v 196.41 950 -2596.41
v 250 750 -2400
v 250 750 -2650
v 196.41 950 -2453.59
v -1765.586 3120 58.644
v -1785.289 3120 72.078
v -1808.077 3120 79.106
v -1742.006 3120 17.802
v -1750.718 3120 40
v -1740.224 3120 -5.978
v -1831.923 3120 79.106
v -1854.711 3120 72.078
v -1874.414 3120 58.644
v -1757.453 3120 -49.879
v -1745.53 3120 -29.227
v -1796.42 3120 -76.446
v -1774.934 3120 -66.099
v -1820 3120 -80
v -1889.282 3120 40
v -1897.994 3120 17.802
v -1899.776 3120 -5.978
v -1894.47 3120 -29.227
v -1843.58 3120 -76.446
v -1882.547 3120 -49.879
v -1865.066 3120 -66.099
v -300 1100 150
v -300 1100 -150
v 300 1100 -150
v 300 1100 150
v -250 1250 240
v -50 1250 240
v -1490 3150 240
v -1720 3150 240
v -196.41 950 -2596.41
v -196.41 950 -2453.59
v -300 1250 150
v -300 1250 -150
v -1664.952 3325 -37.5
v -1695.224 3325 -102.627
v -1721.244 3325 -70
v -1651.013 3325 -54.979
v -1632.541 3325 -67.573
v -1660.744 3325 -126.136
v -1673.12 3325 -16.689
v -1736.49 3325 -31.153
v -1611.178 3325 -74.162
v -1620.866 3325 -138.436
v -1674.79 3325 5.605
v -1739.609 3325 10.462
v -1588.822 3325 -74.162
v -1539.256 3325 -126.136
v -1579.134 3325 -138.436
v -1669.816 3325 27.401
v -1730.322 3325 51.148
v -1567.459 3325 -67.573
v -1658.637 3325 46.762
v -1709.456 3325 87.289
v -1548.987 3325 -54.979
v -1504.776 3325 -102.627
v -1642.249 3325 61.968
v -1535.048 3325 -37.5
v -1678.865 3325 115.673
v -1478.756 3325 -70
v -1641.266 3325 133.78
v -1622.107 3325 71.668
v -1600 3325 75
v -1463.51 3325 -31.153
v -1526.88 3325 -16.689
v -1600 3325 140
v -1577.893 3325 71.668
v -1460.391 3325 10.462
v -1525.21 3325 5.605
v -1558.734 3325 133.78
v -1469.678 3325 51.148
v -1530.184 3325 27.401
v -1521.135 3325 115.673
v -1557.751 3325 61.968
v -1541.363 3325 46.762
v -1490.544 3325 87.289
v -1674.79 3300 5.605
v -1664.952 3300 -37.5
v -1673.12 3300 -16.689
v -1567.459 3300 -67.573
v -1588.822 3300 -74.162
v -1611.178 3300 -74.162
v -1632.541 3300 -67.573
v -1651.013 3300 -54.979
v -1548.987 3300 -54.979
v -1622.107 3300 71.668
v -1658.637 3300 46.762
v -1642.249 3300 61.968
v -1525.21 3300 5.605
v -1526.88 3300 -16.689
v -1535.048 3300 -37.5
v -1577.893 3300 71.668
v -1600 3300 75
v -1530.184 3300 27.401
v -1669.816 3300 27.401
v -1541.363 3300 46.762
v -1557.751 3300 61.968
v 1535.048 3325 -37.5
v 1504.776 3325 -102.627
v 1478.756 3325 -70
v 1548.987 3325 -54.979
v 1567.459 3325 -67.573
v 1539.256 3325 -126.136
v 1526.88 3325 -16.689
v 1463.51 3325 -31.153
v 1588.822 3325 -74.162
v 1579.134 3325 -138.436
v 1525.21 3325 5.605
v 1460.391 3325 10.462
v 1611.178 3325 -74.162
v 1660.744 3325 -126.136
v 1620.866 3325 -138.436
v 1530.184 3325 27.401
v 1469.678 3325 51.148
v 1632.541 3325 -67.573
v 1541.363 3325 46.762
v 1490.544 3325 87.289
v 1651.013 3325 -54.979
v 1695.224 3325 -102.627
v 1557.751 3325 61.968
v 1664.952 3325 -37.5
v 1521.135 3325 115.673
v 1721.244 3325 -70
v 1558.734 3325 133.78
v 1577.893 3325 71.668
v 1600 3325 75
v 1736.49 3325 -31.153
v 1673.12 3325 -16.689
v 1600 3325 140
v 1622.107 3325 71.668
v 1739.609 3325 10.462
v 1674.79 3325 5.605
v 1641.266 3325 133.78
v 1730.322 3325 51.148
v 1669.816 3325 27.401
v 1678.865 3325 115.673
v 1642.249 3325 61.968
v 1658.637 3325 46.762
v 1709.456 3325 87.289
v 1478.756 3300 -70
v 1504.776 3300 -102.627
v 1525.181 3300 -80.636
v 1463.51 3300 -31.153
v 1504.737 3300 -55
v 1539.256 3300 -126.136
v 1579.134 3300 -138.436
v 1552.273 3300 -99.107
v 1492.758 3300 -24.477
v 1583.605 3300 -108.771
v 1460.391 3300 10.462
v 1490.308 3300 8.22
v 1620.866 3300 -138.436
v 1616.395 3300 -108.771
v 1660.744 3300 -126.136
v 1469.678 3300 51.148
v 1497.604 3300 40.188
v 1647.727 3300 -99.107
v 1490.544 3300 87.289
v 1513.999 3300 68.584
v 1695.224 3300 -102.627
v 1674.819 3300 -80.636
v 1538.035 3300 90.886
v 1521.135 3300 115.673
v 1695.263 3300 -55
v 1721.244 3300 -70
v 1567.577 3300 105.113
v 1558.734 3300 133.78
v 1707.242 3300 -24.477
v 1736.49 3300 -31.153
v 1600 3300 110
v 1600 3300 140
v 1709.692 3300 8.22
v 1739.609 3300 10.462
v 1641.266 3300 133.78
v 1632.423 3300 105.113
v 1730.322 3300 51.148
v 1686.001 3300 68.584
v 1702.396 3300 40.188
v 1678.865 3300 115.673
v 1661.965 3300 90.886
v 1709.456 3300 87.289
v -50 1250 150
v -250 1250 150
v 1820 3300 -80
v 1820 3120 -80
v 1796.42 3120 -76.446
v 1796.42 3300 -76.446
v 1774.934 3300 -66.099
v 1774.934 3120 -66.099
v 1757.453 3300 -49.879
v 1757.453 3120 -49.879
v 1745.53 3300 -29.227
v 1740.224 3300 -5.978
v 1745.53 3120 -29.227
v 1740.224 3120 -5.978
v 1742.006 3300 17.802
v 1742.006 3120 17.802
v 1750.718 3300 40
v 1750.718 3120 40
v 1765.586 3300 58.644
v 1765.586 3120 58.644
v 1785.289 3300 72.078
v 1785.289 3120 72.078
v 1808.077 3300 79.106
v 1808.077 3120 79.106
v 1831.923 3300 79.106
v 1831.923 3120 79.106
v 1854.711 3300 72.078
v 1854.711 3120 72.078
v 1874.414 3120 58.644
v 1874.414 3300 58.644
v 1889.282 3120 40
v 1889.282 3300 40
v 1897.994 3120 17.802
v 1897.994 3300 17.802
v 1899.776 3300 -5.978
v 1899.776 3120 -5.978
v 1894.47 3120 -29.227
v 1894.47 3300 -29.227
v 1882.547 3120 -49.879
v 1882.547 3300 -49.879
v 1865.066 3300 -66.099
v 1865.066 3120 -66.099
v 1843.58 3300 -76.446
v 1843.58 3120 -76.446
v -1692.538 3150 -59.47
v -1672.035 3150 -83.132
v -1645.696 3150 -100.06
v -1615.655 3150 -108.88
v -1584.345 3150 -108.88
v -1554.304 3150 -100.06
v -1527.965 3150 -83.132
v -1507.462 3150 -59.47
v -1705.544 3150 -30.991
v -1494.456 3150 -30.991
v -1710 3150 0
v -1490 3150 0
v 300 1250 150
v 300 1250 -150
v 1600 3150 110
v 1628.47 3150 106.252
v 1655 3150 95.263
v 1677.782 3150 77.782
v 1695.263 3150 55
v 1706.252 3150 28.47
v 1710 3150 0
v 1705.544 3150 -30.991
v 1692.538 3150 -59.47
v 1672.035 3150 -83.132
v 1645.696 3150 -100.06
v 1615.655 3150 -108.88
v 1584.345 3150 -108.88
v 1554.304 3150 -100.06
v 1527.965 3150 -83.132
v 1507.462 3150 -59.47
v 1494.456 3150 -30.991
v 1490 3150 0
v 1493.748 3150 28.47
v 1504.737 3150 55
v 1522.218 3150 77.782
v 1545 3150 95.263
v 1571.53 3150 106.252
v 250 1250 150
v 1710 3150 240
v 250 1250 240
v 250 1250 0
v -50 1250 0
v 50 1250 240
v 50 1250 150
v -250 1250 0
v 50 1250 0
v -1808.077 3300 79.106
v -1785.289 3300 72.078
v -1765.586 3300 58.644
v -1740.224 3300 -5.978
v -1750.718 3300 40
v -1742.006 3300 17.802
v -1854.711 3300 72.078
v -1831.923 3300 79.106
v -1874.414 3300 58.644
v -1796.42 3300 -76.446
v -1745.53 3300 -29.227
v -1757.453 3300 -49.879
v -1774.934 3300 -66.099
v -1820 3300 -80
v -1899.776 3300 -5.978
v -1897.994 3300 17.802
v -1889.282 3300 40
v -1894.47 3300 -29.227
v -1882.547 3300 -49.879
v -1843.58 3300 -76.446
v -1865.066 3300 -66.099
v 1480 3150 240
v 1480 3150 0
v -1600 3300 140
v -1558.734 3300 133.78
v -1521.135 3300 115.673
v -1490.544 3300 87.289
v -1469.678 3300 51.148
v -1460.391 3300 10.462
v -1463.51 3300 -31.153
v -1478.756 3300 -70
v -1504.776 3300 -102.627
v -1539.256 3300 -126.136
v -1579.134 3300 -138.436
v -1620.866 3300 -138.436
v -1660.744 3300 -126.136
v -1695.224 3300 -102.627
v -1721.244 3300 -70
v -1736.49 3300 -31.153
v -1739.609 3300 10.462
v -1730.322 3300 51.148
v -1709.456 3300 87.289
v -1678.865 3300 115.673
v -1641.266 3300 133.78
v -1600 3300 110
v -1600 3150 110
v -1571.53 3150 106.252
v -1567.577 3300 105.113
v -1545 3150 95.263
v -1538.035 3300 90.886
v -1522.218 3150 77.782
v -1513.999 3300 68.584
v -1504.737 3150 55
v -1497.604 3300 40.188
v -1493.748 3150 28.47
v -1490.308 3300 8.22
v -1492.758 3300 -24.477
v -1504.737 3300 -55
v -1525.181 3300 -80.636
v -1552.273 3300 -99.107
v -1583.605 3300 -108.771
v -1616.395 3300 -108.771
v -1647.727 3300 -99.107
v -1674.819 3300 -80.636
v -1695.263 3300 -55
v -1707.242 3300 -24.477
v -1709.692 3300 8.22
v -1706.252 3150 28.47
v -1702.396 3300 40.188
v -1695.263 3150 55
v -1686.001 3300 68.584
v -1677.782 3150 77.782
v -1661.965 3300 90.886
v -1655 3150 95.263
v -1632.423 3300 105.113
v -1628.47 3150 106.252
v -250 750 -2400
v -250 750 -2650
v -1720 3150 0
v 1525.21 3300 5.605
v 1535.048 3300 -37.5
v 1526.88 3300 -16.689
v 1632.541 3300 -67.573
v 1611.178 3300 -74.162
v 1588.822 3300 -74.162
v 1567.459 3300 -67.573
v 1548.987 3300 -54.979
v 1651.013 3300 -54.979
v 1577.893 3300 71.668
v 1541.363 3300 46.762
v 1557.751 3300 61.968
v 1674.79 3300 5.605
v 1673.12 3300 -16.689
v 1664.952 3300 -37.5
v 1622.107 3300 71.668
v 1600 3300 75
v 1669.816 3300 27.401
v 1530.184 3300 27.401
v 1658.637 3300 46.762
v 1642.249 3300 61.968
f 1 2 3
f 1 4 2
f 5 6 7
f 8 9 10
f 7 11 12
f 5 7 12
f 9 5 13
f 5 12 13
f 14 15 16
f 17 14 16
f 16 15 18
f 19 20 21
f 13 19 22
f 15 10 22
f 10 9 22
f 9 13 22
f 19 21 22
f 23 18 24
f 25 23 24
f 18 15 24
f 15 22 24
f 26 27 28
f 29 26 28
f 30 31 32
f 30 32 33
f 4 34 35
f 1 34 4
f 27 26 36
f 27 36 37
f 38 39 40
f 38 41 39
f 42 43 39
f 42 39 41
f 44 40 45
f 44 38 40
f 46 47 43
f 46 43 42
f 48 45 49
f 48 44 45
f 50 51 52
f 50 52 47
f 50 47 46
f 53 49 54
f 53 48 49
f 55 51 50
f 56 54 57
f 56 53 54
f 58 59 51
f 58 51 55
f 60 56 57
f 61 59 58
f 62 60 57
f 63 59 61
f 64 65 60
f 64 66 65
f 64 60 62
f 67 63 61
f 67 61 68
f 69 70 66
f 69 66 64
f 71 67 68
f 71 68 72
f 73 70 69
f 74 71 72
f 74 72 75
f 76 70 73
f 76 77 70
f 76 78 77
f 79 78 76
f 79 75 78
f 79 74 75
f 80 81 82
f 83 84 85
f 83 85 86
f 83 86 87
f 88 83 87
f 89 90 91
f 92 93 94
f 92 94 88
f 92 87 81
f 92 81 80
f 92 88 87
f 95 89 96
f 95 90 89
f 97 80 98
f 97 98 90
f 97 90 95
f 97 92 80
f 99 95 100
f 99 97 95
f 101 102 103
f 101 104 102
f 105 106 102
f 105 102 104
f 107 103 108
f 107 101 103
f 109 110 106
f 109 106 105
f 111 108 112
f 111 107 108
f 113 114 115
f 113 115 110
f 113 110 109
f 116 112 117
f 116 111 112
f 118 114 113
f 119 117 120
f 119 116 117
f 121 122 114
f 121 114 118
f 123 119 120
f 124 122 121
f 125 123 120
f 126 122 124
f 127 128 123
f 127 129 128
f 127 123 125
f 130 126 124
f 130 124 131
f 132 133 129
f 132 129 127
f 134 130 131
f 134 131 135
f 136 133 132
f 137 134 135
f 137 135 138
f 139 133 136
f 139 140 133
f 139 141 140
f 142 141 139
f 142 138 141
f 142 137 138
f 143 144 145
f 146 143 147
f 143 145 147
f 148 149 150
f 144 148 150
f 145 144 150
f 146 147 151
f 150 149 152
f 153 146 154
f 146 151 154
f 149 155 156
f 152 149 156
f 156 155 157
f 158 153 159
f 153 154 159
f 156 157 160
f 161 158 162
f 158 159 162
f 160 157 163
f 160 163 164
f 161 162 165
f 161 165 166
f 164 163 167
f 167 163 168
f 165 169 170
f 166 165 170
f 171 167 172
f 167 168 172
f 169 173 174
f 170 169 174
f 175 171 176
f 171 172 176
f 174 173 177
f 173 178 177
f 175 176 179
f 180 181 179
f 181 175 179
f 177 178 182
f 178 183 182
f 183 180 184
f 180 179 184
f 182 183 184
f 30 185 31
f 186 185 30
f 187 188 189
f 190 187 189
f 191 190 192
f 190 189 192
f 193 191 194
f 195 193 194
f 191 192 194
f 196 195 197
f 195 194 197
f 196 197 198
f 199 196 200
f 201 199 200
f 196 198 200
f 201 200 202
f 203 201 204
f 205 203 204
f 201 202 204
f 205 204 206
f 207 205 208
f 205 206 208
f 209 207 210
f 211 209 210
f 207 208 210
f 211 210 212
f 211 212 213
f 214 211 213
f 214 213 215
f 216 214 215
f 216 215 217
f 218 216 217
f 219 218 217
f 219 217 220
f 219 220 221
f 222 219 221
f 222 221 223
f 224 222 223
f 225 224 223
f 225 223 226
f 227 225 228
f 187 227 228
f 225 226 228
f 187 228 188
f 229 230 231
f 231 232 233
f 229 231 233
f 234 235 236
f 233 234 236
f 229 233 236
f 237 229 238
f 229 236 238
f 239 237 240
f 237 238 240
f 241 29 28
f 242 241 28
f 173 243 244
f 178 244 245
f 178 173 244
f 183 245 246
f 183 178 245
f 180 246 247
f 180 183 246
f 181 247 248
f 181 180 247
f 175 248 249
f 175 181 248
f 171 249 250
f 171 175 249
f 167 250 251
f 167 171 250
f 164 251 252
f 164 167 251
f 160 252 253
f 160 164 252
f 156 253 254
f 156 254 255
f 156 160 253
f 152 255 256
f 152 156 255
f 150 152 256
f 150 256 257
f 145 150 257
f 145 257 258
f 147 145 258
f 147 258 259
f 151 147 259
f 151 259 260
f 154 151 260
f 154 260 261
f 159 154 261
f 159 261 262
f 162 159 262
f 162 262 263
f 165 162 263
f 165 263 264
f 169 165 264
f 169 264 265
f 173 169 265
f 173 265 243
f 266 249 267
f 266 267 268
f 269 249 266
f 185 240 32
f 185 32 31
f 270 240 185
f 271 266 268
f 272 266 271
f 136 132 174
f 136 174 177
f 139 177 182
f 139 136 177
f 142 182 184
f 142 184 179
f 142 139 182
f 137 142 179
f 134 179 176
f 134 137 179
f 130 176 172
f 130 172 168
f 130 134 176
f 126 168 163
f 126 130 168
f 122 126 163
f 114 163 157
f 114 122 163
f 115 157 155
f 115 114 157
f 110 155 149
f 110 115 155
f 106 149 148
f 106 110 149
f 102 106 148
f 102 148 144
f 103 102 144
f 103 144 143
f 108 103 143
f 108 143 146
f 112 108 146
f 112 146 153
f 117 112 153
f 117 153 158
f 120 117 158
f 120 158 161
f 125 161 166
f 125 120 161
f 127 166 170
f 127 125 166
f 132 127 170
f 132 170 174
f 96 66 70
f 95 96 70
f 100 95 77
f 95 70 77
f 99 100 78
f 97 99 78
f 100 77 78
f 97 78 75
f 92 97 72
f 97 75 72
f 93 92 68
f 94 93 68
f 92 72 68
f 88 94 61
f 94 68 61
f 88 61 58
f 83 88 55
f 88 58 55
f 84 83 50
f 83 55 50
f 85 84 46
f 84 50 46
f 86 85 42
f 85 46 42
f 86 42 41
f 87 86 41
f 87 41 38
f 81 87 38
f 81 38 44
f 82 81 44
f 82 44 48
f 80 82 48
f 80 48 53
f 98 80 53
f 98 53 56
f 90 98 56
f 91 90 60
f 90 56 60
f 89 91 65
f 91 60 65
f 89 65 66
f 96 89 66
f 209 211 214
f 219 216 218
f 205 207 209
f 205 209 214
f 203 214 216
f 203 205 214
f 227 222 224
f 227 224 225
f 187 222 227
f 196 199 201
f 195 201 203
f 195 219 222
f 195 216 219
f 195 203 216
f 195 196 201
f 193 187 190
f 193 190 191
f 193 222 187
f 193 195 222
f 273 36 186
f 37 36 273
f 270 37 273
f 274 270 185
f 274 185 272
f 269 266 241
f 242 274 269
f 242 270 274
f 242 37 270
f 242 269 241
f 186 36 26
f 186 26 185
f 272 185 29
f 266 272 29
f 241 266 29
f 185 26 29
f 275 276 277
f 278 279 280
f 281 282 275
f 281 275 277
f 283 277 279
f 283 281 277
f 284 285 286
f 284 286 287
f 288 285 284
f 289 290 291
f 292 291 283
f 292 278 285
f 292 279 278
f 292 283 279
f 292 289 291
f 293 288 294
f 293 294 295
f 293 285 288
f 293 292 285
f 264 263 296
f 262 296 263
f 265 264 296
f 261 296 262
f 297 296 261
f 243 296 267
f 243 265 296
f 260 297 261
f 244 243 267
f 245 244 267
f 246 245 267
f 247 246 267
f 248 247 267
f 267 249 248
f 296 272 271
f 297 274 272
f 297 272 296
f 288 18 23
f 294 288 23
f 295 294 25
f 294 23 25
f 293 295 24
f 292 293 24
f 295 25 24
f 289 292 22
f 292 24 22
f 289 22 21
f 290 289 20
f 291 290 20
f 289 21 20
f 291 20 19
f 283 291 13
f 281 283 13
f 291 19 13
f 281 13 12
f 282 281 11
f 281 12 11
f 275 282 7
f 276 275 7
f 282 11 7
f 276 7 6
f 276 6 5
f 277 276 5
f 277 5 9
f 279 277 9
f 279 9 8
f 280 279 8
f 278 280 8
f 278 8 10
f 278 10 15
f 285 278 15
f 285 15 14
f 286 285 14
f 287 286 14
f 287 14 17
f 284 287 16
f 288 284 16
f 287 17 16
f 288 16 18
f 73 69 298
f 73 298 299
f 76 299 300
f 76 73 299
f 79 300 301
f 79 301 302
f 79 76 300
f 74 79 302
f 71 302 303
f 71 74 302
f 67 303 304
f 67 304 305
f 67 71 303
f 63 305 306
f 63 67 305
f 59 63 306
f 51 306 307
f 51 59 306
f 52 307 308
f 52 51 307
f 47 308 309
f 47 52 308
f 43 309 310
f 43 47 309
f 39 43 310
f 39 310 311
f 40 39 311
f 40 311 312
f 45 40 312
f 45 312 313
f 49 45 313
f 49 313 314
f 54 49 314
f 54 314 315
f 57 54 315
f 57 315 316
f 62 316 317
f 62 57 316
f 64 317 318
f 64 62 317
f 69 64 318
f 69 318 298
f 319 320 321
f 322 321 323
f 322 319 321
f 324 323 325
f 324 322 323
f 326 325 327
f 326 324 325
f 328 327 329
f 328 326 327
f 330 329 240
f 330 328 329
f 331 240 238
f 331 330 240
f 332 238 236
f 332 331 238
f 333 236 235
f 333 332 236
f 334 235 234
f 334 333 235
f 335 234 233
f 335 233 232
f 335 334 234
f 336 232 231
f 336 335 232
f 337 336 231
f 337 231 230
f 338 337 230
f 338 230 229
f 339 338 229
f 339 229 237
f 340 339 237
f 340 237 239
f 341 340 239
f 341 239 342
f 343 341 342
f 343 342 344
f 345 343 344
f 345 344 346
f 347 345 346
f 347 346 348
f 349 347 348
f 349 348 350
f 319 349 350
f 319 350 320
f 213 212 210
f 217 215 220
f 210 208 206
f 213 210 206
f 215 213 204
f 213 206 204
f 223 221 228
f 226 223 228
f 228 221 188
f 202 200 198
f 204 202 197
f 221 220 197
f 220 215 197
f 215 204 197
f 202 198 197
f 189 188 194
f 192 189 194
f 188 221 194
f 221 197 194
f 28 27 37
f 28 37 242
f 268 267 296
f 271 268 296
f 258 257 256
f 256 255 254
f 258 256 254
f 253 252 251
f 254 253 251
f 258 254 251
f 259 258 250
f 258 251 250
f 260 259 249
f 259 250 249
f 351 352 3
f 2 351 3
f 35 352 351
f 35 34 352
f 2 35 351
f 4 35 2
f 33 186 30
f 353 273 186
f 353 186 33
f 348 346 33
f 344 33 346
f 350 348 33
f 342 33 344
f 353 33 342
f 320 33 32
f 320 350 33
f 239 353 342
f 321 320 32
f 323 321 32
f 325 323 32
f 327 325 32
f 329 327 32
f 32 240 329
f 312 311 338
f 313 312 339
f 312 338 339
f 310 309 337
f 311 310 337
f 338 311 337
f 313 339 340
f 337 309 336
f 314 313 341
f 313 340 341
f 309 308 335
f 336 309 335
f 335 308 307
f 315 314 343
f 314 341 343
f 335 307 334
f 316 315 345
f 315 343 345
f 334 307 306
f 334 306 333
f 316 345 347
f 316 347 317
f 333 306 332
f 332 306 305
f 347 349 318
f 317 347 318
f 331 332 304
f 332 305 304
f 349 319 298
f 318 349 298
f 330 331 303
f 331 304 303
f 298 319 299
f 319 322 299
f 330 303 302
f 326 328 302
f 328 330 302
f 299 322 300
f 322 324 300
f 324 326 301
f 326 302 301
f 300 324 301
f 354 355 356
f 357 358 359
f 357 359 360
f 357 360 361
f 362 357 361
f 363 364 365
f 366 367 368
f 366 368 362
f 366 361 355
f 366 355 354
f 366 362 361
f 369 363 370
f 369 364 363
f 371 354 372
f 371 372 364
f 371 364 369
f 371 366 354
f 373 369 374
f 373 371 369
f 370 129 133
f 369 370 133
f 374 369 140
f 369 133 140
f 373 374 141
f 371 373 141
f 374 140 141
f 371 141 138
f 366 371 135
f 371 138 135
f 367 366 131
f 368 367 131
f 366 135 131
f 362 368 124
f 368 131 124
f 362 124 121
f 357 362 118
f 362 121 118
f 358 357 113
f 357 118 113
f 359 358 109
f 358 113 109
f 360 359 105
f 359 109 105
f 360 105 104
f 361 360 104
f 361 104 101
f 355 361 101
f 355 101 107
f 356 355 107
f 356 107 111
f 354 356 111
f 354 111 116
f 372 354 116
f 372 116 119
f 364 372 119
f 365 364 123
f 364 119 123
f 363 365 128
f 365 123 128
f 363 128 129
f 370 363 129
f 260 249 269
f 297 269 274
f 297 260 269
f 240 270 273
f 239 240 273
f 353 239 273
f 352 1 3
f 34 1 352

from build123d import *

# Parameters (mm, degrees)
BOSS_EXTRUDE1_START  = 3325
SKETCH1_R            = 140
SKETCH1_R_2          = 75
BOSS_EXTRUDE1_DEPTH  = 25
BOSS_EXTRUDE2_START  = 3300
SKETCH2_R            = 110
BOSS_EXTRUDE2_DEPTH  = 150
BOSS_EXTRUDE3_START  = 3120
SKETCH3_R            = 80
BOSS_EXTRUDE3_DEPTH  = 180
BOSS_EXTRUDE4_START  = 3325
SKETCH4_R            = 140
SKETCH4_R_2          = 75
BOSS_EXTRUDE4_DEPTH  = 25
BOSS_EXTRUDE5_START  = 3300
SKETCH5_R            = 110
BOSS_EXTRUDE5_DEPTH  = 150
BOSS_EXTRUDE6_START  = 3120
SKETCH6_R            = 80
BOSS_EXTRUDE6_DEPTH  = 180
BOSS_EXTRUDE7_DEPTH  = 240
BOSS_EXTRUDE8_DEPTH  = 240
BOSS_EXTRUDE9_START  = 1100
SKETCH9_W            = 600
SKETCH9_H            = 300
BOSS_EXTRUDE9_DEPTH  = 150
BOSS_EXTRUDE10_START = 750
SKETCH10_W           = 500
SKETCH10_H           = 250
BOSS_EXTRUDE10_DEPTH = 200
BOSS_EXTRUDE10_TAPER = 15


with BuildPart() as part:
    # Sketch1 → Boss-Extrude1 (new body)
    with BuildSketch(Plane(origin=(0, 0, 0), x_dir=(1, 0, 0), z_dir=(0, 1, 0)).offset(BOSS_EXTRUDE1_START)):
        with Locations(Location((-1600, 0, 0), (0, 0, 270))):
            Circle(SKETCH1_R)
        with Locations(Location((-1600, 0, 0), (0, 0, 270))):
            Circle(SKETCH1_R_2, mode=Mode.SUBTRACT)
    extrude(amount=-BOSS_EXTRUDE1_DEPTH)

    # Sketch2 → Boss-Extrude2 (add)
    with BuildSketch(Plane(origin=(0, 0, 0), x_dir=(1, 0, 0), z_dir=(0, 1, 0)).offset(BOSS_EXTRUDE2_START)):
        with Locations(Location((-1600, 0, 0), (0, 0, 270))):
            Circle(SKETCH2_R)
    extrude(amount=-BOSS_EXTRUDE2_DEPTH)

    # Sketch7 → Boss-Extrude7 (add)
    with BuildSketch(Plane.XY):
        Polygon((-1720, 3150), (-1490, 3150), (-50, 1250), (-250, 1250), align=None)
    extrude(amount=BOSS_EXTRUDE7_DEPTH)



with BuildPart() as body_2:
    # Sketch3 → Boss-Extrude3 (new body)
    with BuildSketch(Plane(origin=(0, 0, 0), x_dir=(1, 0, 0), z_dir=(0, 1, 0)).offset(BOSS_EXTRUDE3_START)):
        with Locations(Location((-1820, 0, 0), (0, 0, 90))):
            Circle(SKETCH3_R)
    extrude(amount=BOSS_EXTRUDE3_DEPTH)


with BuildPart() as body_3:
    # Sketch4 → Boss-Extrude4 (new body)
    with BuildSketch(Plane(origin=(0, 0, 0), x_dir=(1, 0, 0), z_dir=(0, 1, 0)).offset(BOSS_EXTRUDE4_START)):
        with Locations(Location((1600, 0, 0), (0, 0, 270))):
            Circle(SKETCH4_R)
        with Locations(Location((1600, 0, 0), (0, 0, 270))):
            Circle(SKETCH4_R_2, mode=Mode.SUBTRACT)
    extrude(amount=-BOSS_EXTRUDE4_DEPTH)

    # Sketch5 → Boss-Extrude5 (add)
    with BuildSketch(Plane(origin=(0, 0, 0), x_dir=(1, 0, 0), z_dir=(0, 1, 0)).offset(BOSS_EXTRUDE5_START)):
        with Locations(Location((1600, 0, 0), (0, 0, 270))):
            Circle(SKETCH5_R)
    extrude(amount=-BOSS_EXTRUDE5_DEPTH)

    # Sketch8 → Boss-Extrude8 (add)
    with BuildSketch(Plane.XY):
        Polygon((1480, 3150), (1710, 3150), (250, 1250), (50, 1250), align=None)
    extrude(amount=BOSS_EXTRUDE8_DEPTH)


with BuildPart() as body_4:
    # Sketch6 → Boss-Extrude6 (new body)
    with BuildSketch(Plane(origin=(0, 0, 0), x_dir=(1, 0, 0), z_dir=(0, 1, 0)).offset(BOSS_EXTRUDE6_START)):
        with Locations(Location((1820, 0, 0), (0, 0, 90))):
            Circle(SKETCH6_R)
    extrude(amount=BOSS_EXTRUDE6_DEPTH)


with BuildPart() as part_1:
    add(part.part)

    add(body_3.part)  # Boss-Extrude9 merges body 3
    # Sketch9 → Boss-Extrude9 (add)
    with BuildSketch(Plane(origin=(0, 0, 0), x_dir=(1, 0, 0), z_dir=(0, 1, 0)).offset(BOSS_EXTRUDE9_START)):
        Rectangle(SKETCH9_W, SKETCH9_H)
    extrude(amount=BOSS_EXTRUDE9_DEPTH)


with BuildPart() as body_4_2:
    # Sketch10 → Boss-Extrude10 (new body)
    with BuildSketch(Plane(origin=(0, 0, 0), x_dir=(1, 0, 0), z_dir=(0, 1, 0)).offset(BOSS_EXTRUDE10_START)):
        with Locations((0, 2525)):
            Rectangle(SKETCH10_W, SKETCH10_H)
    extrude(amount=BOSS_EXTRUDE10_DEPTH, taper=BOSS_EXTRUDE10_TAPER)


solid = Compound([body_2.part, body_4.part, part_1.part, body_4_2.part])
